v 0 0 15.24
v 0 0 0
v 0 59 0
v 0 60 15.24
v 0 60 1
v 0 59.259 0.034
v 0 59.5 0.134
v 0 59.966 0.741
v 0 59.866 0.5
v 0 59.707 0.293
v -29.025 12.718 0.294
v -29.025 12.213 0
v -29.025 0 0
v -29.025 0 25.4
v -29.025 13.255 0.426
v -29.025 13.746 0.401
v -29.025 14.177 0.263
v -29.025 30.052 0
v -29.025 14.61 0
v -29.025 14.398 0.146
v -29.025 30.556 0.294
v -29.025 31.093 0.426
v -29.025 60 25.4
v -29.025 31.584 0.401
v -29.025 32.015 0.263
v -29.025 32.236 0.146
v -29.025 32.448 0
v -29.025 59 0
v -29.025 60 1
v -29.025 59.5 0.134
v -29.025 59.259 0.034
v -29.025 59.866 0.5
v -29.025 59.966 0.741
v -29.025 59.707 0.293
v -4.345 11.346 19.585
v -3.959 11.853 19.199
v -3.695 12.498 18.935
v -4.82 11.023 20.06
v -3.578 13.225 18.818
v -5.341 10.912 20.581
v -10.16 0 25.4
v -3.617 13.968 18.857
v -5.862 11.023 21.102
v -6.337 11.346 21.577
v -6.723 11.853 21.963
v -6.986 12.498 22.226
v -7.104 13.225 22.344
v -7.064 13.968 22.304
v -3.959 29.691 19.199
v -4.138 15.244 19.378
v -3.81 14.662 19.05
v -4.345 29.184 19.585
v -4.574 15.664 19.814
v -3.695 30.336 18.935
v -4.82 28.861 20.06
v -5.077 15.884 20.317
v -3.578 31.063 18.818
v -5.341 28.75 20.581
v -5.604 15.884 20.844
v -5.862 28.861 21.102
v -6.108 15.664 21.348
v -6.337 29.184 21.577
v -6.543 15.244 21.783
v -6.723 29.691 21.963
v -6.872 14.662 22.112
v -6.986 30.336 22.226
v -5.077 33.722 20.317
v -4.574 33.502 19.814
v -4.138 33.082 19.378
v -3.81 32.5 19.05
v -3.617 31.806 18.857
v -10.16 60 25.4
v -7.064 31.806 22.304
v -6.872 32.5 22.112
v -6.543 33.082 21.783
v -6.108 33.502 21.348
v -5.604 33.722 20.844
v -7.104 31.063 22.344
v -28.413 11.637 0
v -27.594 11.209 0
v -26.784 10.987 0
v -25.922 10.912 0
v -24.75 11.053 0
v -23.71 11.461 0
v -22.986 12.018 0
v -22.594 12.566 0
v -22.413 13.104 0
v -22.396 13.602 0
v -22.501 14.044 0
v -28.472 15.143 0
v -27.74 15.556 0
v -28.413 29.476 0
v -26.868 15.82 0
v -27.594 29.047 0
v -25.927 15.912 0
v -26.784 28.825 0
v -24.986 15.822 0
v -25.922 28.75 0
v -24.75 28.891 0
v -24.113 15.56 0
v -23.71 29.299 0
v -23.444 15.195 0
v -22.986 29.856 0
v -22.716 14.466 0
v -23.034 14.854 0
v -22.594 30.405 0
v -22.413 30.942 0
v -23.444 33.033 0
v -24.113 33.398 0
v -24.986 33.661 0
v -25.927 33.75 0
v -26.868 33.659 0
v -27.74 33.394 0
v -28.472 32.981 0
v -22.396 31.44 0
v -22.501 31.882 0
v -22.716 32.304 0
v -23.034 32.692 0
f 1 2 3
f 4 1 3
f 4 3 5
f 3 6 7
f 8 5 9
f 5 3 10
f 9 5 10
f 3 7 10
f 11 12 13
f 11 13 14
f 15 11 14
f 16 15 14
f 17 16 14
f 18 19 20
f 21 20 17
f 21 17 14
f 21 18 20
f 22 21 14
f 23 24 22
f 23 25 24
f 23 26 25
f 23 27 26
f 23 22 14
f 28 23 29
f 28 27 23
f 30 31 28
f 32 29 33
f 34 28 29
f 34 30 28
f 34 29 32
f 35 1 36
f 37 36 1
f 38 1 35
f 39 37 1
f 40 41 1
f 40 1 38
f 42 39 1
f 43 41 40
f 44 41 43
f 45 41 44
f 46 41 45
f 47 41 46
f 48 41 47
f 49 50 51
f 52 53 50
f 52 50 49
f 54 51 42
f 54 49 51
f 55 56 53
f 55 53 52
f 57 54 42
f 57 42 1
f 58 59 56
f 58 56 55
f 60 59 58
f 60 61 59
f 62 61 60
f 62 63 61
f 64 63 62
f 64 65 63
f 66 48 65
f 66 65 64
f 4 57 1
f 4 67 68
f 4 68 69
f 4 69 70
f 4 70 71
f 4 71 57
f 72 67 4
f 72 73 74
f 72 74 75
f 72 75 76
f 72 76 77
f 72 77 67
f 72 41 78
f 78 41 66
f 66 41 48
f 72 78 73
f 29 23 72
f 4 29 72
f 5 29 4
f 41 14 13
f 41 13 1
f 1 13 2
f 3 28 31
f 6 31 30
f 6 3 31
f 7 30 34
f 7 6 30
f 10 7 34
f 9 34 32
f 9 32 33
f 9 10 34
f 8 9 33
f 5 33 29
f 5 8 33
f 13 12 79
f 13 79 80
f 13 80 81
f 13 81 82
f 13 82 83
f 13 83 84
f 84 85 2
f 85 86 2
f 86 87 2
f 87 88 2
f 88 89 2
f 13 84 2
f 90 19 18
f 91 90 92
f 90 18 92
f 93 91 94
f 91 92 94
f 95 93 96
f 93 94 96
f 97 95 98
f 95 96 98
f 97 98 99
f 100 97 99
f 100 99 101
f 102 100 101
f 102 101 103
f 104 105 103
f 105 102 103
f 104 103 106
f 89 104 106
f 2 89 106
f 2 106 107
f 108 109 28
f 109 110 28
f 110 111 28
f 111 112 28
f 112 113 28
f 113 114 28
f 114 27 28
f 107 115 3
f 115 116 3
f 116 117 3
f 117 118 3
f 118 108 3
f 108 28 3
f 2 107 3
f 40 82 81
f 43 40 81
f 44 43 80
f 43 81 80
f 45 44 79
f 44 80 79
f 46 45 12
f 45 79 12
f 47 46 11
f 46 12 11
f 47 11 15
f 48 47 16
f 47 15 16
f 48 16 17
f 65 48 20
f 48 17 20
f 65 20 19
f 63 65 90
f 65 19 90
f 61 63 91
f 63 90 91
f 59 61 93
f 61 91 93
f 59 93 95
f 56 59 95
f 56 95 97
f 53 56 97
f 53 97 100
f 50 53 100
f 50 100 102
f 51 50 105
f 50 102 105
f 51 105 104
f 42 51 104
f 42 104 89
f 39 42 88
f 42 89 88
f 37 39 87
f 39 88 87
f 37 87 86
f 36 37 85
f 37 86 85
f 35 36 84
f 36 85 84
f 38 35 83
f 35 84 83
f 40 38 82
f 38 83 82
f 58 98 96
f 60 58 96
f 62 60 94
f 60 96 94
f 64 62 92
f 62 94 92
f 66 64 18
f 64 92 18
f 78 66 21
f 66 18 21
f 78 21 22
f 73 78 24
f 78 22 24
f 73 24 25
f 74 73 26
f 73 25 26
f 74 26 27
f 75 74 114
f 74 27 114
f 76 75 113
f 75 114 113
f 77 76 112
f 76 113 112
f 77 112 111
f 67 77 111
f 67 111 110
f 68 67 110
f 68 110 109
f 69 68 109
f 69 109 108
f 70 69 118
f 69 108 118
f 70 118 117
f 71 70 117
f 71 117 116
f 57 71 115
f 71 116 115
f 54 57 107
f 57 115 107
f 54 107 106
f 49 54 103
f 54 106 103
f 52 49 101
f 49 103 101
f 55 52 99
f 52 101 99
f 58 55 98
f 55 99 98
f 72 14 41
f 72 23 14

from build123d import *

# Parameters (mm, degrees)
F0_W     = 29.0246267504
F0_H     = 60
F1_DEPTH = 25.4
F2_SIZE  = 10.16
F4_D     = 5
F5_R     = 1


with BuildPart() as f1:
    # F0 (on Top) → F1 (new body)
    with BuildSketch(Plane.XY):
        with Locations((-14.5123133752, 30)):
            Rectangle(F0_W, F0_H)
    extrude(amount=F1_DEPTH)

    # F2
    f2_edges = [f1.edges().sort_by_distance(p)[0] for p in [
        (0, 30, 25.4),
    ]]
    chamfer(f2_edges, length=F2_SIZE)

    # F4 (through all)
    with Locations(Plane(origin=(7.62, 0, 7.62), x_dir=(0, 1, 0), z_dir=(0.7071067812, 0, 0.7071067812))):
        with Locations((13.411517255, 18.3293204755), (31.2496982515, 18.3293204755)):
            Hole(F4_D / 2)

    # F5
    f5_edges = [f1.edges().sort_by_distance(p)[0] for p in [
        (-14.512313, 60, 0),
    ]]
    fillet(f5_edges, radius=F5_R)


solid = f1.part
